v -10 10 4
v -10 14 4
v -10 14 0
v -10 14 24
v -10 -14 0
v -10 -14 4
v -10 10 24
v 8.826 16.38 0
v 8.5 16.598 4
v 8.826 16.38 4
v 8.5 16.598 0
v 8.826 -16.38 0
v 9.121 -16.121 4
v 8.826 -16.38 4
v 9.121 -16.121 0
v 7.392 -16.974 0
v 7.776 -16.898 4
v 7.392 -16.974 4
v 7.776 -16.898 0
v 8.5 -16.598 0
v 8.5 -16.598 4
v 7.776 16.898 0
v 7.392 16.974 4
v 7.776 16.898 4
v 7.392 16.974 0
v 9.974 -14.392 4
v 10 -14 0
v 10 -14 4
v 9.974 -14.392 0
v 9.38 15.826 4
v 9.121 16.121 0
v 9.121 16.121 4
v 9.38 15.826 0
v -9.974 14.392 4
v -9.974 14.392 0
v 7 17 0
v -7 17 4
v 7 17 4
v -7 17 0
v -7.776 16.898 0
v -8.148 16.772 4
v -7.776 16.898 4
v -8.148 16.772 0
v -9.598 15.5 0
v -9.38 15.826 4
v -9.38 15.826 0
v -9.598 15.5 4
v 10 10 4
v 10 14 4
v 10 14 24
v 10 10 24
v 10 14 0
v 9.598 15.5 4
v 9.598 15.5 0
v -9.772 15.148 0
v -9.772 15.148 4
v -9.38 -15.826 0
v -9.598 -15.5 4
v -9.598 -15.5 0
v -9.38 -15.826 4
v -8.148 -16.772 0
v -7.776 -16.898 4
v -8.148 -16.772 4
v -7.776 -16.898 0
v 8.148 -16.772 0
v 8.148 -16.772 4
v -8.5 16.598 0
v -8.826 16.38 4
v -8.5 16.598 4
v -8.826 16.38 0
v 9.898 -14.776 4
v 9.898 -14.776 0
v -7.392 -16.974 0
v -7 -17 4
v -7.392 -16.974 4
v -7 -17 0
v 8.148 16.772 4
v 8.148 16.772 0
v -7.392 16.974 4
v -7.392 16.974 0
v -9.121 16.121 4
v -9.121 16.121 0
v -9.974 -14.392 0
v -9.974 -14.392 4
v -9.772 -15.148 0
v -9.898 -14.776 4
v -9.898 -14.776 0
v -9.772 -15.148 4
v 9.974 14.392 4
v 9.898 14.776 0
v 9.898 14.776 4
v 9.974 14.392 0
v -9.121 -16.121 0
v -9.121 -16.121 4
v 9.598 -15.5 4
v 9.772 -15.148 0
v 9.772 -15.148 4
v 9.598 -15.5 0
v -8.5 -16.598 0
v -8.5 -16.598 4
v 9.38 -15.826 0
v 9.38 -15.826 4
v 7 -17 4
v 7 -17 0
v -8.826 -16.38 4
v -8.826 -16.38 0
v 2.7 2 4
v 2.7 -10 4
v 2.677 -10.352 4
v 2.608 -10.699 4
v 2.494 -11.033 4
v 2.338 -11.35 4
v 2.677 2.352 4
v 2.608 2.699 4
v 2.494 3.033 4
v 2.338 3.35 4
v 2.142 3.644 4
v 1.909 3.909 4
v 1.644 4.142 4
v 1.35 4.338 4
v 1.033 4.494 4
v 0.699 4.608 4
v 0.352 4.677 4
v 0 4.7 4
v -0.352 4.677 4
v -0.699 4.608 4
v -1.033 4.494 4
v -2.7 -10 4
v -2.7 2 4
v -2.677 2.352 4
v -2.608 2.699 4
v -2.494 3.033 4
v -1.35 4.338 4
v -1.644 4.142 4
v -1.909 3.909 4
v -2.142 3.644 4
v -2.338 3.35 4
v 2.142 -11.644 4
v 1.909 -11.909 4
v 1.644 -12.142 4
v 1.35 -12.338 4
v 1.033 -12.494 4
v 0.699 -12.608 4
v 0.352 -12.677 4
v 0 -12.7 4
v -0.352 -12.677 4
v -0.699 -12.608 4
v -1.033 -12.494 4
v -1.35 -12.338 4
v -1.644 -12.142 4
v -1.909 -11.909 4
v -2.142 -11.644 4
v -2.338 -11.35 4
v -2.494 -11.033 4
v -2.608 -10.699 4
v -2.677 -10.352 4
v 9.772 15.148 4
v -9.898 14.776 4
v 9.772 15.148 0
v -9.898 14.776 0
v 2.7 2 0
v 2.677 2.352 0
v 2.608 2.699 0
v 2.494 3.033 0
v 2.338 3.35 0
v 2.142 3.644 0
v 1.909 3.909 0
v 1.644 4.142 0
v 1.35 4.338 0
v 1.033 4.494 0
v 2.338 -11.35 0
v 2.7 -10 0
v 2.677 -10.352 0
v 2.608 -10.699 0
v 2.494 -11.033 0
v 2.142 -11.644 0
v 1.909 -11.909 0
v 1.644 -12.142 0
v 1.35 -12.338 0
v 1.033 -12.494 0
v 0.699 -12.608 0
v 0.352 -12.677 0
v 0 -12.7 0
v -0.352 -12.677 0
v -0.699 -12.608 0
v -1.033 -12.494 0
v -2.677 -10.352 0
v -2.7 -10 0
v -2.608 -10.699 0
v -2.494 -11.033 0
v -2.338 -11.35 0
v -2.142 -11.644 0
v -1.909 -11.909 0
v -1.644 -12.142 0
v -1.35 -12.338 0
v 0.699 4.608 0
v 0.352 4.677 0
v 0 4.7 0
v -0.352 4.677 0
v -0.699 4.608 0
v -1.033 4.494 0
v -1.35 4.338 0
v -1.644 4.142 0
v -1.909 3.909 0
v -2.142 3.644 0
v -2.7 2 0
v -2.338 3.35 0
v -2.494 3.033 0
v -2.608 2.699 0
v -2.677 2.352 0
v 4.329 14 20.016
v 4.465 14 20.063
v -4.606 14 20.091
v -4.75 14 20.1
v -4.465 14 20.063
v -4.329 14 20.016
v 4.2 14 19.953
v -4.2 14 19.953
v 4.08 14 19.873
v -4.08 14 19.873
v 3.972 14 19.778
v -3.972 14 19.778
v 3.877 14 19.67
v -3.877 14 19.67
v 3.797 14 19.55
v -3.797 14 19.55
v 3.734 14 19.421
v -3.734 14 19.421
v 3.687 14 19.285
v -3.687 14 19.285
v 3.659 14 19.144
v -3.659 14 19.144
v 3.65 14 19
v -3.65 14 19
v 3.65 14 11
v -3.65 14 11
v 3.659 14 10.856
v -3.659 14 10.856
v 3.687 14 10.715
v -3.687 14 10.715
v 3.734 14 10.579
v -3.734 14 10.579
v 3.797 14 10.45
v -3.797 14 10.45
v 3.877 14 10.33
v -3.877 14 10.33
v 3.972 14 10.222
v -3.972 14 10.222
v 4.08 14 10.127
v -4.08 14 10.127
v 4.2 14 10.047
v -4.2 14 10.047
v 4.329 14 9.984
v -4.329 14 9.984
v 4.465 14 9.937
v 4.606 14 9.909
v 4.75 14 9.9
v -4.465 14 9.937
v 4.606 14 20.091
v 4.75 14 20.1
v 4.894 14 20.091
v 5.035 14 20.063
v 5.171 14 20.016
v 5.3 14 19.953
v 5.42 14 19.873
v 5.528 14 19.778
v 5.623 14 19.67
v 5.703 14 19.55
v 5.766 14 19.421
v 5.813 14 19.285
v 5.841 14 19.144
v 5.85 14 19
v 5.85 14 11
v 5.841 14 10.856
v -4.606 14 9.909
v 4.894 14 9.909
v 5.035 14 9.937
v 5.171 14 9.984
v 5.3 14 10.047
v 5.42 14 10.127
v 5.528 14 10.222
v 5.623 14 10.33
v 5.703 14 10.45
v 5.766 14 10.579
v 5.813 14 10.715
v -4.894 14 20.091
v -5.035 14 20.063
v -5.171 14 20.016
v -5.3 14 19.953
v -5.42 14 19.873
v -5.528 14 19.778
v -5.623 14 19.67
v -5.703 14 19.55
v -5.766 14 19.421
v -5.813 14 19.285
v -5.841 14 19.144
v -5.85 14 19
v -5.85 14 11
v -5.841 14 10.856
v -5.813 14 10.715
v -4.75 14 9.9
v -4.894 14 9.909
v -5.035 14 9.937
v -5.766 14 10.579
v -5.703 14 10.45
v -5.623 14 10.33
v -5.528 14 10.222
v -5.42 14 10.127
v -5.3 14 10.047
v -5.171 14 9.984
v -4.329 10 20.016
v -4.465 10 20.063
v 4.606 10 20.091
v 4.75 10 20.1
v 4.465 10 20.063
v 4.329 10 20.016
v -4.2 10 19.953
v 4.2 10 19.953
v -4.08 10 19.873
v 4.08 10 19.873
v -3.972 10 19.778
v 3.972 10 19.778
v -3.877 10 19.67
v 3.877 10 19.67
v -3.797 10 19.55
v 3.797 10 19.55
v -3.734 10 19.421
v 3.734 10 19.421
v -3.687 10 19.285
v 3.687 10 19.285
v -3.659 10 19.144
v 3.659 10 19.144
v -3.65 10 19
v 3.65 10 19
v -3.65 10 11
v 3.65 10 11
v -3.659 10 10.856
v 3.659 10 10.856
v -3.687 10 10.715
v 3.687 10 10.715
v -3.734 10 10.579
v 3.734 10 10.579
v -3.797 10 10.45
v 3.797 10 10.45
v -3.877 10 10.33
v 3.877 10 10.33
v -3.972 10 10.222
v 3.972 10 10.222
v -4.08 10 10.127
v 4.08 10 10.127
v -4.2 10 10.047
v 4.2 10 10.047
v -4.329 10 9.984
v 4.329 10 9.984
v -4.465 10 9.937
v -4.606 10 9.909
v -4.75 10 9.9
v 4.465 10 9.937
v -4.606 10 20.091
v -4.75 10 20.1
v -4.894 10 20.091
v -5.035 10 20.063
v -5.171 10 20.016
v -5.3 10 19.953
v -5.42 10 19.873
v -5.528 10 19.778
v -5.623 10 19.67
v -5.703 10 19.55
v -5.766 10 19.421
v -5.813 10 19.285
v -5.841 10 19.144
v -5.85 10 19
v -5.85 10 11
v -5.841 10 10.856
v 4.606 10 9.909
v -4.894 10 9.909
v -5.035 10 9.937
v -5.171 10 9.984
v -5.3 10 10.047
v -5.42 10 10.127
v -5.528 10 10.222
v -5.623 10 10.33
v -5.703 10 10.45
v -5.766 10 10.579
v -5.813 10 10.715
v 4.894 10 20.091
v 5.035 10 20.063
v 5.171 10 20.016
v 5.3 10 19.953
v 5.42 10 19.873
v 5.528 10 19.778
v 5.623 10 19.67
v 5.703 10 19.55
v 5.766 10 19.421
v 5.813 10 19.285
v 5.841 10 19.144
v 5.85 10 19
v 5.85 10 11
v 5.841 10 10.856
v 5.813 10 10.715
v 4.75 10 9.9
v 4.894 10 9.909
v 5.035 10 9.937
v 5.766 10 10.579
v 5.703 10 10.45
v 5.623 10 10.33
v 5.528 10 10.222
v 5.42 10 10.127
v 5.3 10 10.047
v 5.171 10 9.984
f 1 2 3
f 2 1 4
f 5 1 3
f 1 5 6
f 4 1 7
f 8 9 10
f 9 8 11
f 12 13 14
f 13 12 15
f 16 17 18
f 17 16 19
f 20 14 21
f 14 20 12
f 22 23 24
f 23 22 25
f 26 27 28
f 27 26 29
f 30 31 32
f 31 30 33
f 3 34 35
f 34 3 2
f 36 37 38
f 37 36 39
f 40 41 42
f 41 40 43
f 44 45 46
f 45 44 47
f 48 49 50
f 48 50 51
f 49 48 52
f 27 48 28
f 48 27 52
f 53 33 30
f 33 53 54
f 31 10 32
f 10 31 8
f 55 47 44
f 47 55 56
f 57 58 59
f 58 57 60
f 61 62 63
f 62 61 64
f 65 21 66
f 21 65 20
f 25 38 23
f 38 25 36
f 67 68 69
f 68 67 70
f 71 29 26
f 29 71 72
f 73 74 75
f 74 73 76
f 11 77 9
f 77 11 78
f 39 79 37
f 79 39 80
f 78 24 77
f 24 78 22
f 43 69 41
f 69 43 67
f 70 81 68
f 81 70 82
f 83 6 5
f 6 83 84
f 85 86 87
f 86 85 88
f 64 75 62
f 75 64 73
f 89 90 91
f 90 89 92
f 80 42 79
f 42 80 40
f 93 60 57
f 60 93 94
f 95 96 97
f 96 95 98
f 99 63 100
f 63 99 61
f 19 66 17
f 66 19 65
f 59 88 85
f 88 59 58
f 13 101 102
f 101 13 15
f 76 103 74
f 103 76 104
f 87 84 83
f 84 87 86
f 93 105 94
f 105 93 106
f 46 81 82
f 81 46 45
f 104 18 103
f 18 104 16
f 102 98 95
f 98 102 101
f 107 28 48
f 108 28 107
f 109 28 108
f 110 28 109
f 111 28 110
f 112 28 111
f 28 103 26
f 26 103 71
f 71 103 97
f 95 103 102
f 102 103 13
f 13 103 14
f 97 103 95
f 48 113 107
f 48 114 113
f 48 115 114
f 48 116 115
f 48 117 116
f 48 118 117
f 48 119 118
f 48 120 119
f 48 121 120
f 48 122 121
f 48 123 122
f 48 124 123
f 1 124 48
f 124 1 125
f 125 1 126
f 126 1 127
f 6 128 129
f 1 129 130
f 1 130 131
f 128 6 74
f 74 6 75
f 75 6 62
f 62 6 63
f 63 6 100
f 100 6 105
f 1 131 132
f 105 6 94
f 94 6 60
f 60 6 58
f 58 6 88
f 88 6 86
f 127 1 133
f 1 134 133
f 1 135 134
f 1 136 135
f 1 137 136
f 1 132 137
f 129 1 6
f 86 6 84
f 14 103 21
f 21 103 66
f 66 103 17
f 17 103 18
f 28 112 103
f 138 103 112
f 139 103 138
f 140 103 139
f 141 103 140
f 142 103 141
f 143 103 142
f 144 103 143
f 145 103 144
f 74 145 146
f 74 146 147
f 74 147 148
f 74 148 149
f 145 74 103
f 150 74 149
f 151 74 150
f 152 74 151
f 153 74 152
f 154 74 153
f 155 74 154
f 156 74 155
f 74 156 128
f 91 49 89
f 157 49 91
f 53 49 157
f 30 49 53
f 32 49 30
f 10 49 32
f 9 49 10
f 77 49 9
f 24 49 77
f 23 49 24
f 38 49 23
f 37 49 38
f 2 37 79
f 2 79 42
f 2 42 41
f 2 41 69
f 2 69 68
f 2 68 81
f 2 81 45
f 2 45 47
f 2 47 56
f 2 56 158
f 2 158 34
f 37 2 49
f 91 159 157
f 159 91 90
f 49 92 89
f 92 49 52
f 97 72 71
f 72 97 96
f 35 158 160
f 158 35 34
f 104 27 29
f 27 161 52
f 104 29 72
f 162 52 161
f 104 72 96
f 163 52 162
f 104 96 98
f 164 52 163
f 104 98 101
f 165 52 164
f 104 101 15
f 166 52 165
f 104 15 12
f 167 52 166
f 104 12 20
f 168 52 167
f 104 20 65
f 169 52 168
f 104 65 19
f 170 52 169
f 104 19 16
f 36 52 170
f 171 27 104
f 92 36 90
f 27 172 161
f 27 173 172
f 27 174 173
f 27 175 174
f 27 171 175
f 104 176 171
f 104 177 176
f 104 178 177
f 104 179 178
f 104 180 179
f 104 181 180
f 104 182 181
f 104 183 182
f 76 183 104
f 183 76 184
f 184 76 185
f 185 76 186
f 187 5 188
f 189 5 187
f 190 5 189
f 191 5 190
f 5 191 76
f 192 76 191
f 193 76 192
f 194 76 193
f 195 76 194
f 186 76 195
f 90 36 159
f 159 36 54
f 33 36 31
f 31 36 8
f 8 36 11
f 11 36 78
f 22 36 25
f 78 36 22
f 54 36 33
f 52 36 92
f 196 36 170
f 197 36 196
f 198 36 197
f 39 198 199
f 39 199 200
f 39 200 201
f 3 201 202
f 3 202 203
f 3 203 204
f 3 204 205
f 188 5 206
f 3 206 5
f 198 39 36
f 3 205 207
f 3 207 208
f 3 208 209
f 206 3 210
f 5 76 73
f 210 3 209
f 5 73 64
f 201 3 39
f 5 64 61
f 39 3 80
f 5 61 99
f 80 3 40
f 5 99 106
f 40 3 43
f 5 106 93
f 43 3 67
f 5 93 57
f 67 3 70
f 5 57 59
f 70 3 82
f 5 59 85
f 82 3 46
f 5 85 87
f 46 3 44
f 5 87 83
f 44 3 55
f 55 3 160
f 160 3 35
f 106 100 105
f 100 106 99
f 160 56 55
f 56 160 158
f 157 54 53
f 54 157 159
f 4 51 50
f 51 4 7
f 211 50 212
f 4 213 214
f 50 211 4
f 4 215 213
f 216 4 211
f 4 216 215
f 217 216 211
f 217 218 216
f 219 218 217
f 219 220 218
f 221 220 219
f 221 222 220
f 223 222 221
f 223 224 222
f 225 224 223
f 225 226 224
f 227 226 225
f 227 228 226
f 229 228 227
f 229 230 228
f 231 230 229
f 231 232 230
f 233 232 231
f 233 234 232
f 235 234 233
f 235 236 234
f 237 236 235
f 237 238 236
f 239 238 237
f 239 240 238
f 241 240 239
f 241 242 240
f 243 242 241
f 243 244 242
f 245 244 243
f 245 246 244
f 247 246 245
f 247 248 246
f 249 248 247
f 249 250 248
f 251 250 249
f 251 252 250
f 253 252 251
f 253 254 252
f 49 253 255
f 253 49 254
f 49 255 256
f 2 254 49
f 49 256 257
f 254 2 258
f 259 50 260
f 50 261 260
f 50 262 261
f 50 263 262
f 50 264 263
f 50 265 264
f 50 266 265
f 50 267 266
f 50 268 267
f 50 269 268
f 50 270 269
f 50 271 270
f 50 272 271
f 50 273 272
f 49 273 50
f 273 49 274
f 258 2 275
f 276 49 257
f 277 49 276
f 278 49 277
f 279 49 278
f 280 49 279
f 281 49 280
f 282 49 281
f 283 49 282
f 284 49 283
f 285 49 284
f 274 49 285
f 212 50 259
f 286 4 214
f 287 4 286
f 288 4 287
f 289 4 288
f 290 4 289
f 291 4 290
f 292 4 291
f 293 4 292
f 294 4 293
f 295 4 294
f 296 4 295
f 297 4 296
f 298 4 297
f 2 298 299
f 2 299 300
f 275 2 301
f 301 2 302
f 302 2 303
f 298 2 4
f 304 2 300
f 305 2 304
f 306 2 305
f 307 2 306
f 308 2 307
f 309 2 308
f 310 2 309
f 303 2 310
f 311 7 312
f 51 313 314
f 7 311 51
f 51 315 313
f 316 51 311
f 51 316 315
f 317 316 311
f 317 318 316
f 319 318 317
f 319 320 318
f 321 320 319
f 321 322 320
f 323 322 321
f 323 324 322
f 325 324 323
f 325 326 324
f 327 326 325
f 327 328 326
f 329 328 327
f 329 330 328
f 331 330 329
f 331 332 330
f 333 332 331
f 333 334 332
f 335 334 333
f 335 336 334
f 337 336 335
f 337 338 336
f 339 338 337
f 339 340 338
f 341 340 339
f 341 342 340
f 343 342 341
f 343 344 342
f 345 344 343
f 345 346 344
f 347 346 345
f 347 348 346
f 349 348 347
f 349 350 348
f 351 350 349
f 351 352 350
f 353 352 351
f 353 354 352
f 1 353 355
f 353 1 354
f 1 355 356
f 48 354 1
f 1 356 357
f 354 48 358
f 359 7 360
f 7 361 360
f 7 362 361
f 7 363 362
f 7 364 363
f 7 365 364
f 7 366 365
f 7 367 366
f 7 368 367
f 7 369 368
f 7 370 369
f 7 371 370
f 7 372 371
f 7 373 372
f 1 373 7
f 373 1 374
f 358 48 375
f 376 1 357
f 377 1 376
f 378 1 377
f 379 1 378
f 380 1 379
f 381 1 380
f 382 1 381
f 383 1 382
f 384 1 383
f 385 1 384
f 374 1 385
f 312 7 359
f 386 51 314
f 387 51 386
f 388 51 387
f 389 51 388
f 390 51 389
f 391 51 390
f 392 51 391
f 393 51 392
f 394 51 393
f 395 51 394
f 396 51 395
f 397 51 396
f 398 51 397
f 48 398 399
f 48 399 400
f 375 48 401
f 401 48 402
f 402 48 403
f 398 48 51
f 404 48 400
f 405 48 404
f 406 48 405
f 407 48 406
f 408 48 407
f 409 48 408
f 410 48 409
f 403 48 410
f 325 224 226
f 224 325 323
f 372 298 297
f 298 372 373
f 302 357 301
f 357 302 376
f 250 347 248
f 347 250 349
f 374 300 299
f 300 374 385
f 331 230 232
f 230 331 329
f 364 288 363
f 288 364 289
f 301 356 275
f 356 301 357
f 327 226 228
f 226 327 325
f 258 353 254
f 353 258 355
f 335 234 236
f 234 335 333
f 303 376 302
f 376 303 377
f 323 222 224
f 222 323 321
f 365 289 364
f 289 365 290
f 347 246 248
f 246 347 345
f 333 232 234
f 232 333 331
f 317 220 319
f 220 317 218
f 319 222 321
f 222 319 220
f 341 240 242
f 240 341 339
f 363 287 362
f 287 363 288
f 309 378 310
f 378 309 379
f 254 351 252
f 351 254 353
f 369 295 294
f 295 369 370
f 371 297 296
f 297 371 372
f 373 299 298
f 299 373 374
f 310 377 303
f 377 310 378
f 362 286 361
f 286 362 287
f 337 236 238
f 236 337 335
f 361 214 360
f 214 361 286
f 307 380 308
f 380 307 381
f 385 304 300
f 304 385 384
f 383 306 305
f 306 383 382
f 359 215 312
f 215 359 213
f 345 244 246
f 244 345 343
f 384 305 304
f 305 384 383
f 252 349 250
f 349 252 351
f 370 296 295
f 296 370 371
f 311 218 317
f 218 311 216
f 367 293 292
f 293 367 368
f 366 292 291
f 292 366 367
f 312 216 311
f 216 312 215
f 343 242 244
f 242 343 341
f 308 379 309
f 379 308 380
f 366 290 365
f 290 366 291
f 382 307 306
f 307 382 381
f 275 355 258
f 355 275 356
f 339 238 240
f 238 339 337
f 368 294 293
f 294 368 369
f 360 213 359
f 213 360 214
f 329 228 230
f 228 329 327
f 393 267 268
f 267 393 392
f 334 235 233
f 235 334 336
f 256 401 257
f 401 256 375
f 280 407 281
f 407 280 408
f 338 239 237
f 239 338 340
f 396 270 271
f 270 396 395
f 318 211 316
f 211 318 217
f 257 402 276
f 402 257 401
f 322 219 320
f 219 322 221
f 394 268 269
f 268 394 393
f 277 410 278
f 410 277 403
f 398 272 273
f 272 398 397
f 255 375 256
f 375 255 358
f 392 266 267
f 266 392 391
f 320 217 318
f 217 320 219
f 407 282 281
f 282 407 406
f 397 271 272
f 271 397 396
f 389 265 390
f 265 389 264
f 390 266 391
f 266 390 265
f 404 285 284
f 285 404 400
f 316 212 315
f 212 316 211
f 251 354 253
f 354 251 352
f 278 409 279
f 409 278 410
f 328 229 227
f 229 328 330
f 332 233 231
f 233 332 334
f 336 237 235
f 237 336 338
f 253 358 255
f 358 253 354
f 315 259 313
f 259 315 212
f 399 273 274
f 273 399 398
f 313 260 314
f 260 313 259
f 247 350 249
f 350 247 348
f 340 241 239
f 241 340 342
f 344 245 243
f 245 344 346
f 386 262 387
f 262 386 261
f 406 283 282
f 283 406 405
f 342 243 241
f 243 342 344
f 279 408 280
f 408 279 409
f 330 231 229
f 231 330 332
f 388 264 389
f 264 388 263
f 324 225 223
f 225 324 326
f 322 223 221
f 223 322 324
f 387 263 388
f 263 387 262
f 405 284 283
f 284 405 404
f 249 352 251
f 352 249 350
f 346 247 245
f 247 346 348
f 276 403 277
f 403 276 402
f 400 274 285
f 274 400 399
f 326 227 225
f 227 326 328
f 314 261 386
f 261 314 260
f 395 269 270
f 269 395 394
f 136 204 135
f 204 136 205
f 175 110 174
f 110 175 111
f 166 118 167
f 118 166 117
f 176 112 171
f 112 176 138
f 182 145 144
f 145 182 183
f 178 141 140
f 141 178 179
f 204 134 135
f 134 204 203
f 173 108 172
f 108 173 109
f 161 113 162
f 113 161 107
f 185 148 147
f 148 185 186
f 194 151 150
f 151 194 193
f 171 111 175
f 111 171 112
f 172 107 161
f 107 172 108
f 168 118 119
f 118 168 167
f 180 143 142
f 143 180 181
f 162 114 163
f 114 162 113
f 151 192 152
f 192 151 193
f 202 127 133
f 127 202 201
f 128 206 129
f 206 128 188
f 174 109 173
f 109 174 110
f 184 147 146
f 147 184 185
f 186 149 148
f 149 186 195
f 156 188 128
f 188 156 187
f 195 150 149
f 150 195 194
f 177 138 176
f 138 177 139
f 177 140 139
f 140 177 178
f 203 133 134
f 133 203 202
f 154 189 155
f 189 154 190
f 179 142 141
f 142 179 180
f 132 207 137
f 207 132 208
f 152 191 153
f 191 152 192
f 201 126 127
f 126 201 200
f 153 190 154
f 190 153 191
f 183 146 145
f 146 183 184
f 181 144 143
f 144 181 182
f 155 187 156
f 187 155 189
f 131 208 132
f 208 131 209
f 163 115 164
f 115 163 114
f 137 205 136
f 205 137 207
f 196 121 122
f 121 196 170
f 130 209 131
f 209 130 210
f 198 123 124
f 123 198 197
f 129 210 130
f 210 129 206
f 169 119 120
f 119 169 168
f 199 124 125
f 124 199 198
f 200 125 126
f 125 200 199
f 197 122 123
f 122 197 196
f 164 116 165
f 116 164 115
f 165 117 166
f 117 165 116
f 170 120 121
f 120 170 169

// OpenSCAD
// file: lib/comun.scad
// =====================================================================
// AutoSwapEnder3Pro - parametros y utilidades comunes de las piezas
// Licencia MIT. Unidades: milimetros.
//
// Sistema de coordenadas de la ESTACION (el mismo en todas las piezas que
// se montan en ella):
//   s : a lo largo de la estacion, 0 = HOME del carro, crece hacia la impresora
//   x : a lo ancho, 0 = eje central (riel lineal), +x = lado de la caja de descarga
//   z : vertical, 0 = cara superior de la base de perfiles 2020 ("b" en la guia)
// El plano de transferencia (superficie por la que se deslizan las placas)
// esta en z = PLANO. Se ajusta a la altura de la cama de la impresora con las
// patas niveladoras, NO cambiando estas piezas.
// =====================================================================

$fn = 48;

// ----------------------------------------------------- placas y cama
placa_ancho  = 235;     // placa PEI
placa_largo  = 235;
placa_esp    = 0.6;     // espesor real de tus placas (mide con calibrador; 0.5 a 0.75)
voladizo     = 11;      // cuanto sobresale la placa (o su lengüeta) por delante de la cama

// ----------------------------------------------------- estacion (alturas sobre la base)
PLANO        = 60;      // plano de transferencia sobre la cara superior de la base
RIEL_SUP     = 20;      // cara superior del riel lineal (2020 apoyado en los travesaños)
ZP           = PLANO - RIEL_SUP;  // = 40: plano de transferencia sobre el riel lineal

// zapata (debe coincidir con zapata.scad)
zapata_bajo  = 8;       // cuanto cuelga la zapata por debajo de la placa
zapata_bolsillo = 6;    // profundidad del bolsillo para el dedo (desde abajo)

// cargador (ascensor)
paso_estante = 14;      // distancia vertical entre placas en el cargador
niveles      = 6;       // placas que caben en el cargador

// ----------------------------------------------------- perfil y tornilleria
perfil      = 20;       // perfil de aluminio 2020
ranura_ancho = 6.2;     // boca de la ranura (serie 20)
holgura     = 0.3;      // holgura general de impresion

m2_paso     = 1.8;   // agujero para autorroscante M2 (servos)
m3          = 3.4;   // paso libre M3
m3_rosca    = 2.7;   // para roscar M3 directamente en plastico
m3_tuerca   = 5.7;   // M3: entre caras + holgura
m3_tuerca_h = 2.6;
m3_cabeza   = 6.2;
m4          = 4.4;
m5          = 5.4;   // paso libre M5
m5_cabeza   = 9.2;
m5_tuerca   = 8.2;   // M5: entre caras + holgura

// ruedas en V estandar (Openbuilds "Solid V Wheel" + rodamientos 625)
rueda_d      = 23.9;
rueda_ancho  = 10.2;
rueda_sep    = 39.26;   // distancia entre centros de ruedas a ambos lados de un 2020
excentrica_d = 7.2;     // alojamiento del espaciador excentrico
espaciador_h = 6;       // espaciador (excentrico o fijo) entre rueda y placa

// ----------------------------------------------------- utilidades

// Caja con aristas verticales redondeadas (r) apoyada en z=0.
module caja_r(size, r = 2) {
  r2 = min(r, size[0] / 2 - 0.01, size[1] / 2 - 0.01);
  hull() for (ix = [r2, size[0] - r2], iy = [r2, size[1] - r2])
    translate([ix, iy, 0]) cylinder(r = r2, h = size[2]);
}

// Igual pero centrada en x e y.
module caja_rc(size, r = 2) { translate([-size[0] / 2, -size[1] / 2, 0]) caja_r(size, r); }

// Prisma hexagonal para tuercas (ec = medida entre caras).
module hexagono(ec, h) { cylinder(d = ec / cos(30), h = h, $fn = 6); }

// Ranura (agujero alargado) a lo largo de x.
module ranura(largo, d, h) {
  hull() for (i = [-largo / 2, largo / 2]) translate([i, 0, 0]) cylinder(d = d, h = h);
}

// Taladro M5 con avellanado para la cabeza (para atornillar a un perfil con tuerca en T).
module taladro_m5(h, cabeza = 4) {
  translate([0, 0, -0.1]) cylinder(d = m5, h = h + 0.2);
  translate([0, 0, h - cabeza]) cylinder(d = m5_cabeza + 0.6, h = cabeza + 0.1);
}

// Taladro M3 pasante con alojamiento de tuerca hexagonal por debajo.
module taladro_m3_tuerca(h, prof_tuerca = m3_tuerca_h + 0.2) {
  translate([0, 0, -0.1]) cylinder(d = m3, h = h + 0.2);
  translate([0, 0, -0.1]) hexagono(m3_tuerca, prof_tuerca + 0.1);
}

// Perfil 2020 de referencia (solo para ensamble y comprobaciones visuales).
module perfil2020(largo) {
  difference() {
    translate([-10, -10, 0]) cube([20, 20, largo]);
    for (a = [0, 90, 180, 270]) rotate([0, 0, a])
      translate([10 - 1.8, -ranura_ancho / 2, -1]) cube([2, ranura_ancho, largo + 2]);
    translate([0, 0, -1]) cylinder(d = 4.2, h = largo + 2);
  }
}

// Microinterruptor KW11-3Z con palanca de rodillo (referencia: 20 x 6.4 x 10 mm,
// taladros M2 a 9.5 mm). Agujeros de montaje, con la cara de montaje en z=0.
module taladros_kw11(h = 10) {
  for (i = [-4.75, 4.75]) translate([i, 0, -0.1]) cylinder(d = 2.2, h = h + 0.2);
}
// main file
// =====================================================================
// SOPORTES DE SENSORES
// Material: PETG. 4 perimetros, 40 %. Imprimir como sale el STL.
//   pieza = "final_carrera" : microinterruptor KW11-3Z sobre un perfil 2020
//                             (HOME del carro y HOME del ascensor). Imprimir 2.
//   pieza = "inductivo_cama" : sensor inductivo M8 (PLACA_EN_CAMA) sobre el
//                             travesaño del lado de la impresora: detecta el acero
//                             del voladizo de la placa asentada (x = +60, s = 541).
//   pieza = "inductivo_descarga" : sensor inductivo M8 (PLACA_EN_DESCARGA) en la
//                             cara interior del riel derecho (x = 92, s = 400).
// Sensor recomendado: LJ8A3-2-Z/BX de 5 V (NPN, normalmente abierto, alcance 2 mm).
// Se fija con sus dos tuercas M8 a la pestaña: asi se regula la altura (la cara
// del sensor debe quedar 1-1.5 mm por debajo de la placa).
// =====================================================================
include <lib/comun.scad>

pieza = "final_carrera";

module final_carrera() {
  difference() {
    union() {
      caja_rc([20, 34, 4], 3);
      translate([-10, 10, 0]) cube([20, 4, 24]);
    }
    // ranura M5 a la tuerca en T (regulable +-6 mm)
    translate([0, -4, -0.1]) rotate([0, 0, 90]) ranura(12, m5, 5);
    // taladros M2 del interruptor (ranurados en altura)
    for (sx = [-4.75, 4.75]) translate([sx, 9, 15]) rotate([-90, 0, 0])
      hull() for (dz = [-4, 4]) translate([0, dz, 0]) cylinder(d = 2.2, h = 6);
  }
}

// Pestaña con agujero M8 a una altura dada sobre el pie.
module inductivo(alto, voladizo_tab, pie_vertical) {
  difference() {
    union() {
      if (pie_vertical) {
        // pie atornillado a la cara lateral de un perfil (2 x M5)
        translate([-3, -15, 0]) cube([6, 30, alto + 5]);
      } else {
        translate([-15, -10, 0]) caja_r([30, 20, 4], 2);
        translate([-6, -10, 0]) cube([12, 20, alto + 5]);
      }
      // pestaña horizontal
      translate([0, -11, alto]) caja_r([voladizo_tab + 9, 22, 5], 3);
      hull() {
        translate([0, -2, alto - 10]) cube([1, 4, 10]);
        translate([0, -2, alto]) cube([voladizo_tab - 6, 4, 1]);
      }
    }
    translate([voladizo_tab, 0, alto - 1]) cylinder(d = 8.4, h = 7);
    if (pie_vertical) {
      for (sy = [-9, 9]) translate([-4, sy, 6]) rotate([0, 90, 0]) cylinder(d = m5, h = 8);
    } else {
      for (sx = [-11, 11]) translate([sx, 0, -0.1]) cylinder(d = m5, h = 5);
    }
  }
}

// Variante para el travesaño del lado de la impresora: el sensor queda 7 mm por
// delante del eje del travesaño (s = 542), bajo el voladizo de acero de la placa.
module inductivo_cama() {
  alto = 34;
  difference() {
    union() {
      translate([-15, -10, 0]) caja_r([30, 20, 4], 2);
      translate([-8, -10, 0]) cube([16, 7, alto + 5]);
      translate([-11, -10, alto]) caja_r([22, 22, 5], 3);
    }
    translate([0, 7, alto - 1]) cylinder(d = 8.4, h = 7);
    for (sx = [-11, 11]) translate([sx, 0, -0.1]) cylinder(d = m5, h = 5);
  }
}

if (pieza == "final_carrera") final_carrera();
else if (pieza == "inductivo_cama") inductivo_cama();
// Variante para la cara interior del riel derecho: los 2 tornillos M5 van a la
// ranura lateral del perfil (6 mm sobre la base de la pieza); la pestaña queda
// 5 mm por debajo del plano de las placas.
else inductivo(alto = 11, voladizo_tab = 14, pie_vertical = true);
